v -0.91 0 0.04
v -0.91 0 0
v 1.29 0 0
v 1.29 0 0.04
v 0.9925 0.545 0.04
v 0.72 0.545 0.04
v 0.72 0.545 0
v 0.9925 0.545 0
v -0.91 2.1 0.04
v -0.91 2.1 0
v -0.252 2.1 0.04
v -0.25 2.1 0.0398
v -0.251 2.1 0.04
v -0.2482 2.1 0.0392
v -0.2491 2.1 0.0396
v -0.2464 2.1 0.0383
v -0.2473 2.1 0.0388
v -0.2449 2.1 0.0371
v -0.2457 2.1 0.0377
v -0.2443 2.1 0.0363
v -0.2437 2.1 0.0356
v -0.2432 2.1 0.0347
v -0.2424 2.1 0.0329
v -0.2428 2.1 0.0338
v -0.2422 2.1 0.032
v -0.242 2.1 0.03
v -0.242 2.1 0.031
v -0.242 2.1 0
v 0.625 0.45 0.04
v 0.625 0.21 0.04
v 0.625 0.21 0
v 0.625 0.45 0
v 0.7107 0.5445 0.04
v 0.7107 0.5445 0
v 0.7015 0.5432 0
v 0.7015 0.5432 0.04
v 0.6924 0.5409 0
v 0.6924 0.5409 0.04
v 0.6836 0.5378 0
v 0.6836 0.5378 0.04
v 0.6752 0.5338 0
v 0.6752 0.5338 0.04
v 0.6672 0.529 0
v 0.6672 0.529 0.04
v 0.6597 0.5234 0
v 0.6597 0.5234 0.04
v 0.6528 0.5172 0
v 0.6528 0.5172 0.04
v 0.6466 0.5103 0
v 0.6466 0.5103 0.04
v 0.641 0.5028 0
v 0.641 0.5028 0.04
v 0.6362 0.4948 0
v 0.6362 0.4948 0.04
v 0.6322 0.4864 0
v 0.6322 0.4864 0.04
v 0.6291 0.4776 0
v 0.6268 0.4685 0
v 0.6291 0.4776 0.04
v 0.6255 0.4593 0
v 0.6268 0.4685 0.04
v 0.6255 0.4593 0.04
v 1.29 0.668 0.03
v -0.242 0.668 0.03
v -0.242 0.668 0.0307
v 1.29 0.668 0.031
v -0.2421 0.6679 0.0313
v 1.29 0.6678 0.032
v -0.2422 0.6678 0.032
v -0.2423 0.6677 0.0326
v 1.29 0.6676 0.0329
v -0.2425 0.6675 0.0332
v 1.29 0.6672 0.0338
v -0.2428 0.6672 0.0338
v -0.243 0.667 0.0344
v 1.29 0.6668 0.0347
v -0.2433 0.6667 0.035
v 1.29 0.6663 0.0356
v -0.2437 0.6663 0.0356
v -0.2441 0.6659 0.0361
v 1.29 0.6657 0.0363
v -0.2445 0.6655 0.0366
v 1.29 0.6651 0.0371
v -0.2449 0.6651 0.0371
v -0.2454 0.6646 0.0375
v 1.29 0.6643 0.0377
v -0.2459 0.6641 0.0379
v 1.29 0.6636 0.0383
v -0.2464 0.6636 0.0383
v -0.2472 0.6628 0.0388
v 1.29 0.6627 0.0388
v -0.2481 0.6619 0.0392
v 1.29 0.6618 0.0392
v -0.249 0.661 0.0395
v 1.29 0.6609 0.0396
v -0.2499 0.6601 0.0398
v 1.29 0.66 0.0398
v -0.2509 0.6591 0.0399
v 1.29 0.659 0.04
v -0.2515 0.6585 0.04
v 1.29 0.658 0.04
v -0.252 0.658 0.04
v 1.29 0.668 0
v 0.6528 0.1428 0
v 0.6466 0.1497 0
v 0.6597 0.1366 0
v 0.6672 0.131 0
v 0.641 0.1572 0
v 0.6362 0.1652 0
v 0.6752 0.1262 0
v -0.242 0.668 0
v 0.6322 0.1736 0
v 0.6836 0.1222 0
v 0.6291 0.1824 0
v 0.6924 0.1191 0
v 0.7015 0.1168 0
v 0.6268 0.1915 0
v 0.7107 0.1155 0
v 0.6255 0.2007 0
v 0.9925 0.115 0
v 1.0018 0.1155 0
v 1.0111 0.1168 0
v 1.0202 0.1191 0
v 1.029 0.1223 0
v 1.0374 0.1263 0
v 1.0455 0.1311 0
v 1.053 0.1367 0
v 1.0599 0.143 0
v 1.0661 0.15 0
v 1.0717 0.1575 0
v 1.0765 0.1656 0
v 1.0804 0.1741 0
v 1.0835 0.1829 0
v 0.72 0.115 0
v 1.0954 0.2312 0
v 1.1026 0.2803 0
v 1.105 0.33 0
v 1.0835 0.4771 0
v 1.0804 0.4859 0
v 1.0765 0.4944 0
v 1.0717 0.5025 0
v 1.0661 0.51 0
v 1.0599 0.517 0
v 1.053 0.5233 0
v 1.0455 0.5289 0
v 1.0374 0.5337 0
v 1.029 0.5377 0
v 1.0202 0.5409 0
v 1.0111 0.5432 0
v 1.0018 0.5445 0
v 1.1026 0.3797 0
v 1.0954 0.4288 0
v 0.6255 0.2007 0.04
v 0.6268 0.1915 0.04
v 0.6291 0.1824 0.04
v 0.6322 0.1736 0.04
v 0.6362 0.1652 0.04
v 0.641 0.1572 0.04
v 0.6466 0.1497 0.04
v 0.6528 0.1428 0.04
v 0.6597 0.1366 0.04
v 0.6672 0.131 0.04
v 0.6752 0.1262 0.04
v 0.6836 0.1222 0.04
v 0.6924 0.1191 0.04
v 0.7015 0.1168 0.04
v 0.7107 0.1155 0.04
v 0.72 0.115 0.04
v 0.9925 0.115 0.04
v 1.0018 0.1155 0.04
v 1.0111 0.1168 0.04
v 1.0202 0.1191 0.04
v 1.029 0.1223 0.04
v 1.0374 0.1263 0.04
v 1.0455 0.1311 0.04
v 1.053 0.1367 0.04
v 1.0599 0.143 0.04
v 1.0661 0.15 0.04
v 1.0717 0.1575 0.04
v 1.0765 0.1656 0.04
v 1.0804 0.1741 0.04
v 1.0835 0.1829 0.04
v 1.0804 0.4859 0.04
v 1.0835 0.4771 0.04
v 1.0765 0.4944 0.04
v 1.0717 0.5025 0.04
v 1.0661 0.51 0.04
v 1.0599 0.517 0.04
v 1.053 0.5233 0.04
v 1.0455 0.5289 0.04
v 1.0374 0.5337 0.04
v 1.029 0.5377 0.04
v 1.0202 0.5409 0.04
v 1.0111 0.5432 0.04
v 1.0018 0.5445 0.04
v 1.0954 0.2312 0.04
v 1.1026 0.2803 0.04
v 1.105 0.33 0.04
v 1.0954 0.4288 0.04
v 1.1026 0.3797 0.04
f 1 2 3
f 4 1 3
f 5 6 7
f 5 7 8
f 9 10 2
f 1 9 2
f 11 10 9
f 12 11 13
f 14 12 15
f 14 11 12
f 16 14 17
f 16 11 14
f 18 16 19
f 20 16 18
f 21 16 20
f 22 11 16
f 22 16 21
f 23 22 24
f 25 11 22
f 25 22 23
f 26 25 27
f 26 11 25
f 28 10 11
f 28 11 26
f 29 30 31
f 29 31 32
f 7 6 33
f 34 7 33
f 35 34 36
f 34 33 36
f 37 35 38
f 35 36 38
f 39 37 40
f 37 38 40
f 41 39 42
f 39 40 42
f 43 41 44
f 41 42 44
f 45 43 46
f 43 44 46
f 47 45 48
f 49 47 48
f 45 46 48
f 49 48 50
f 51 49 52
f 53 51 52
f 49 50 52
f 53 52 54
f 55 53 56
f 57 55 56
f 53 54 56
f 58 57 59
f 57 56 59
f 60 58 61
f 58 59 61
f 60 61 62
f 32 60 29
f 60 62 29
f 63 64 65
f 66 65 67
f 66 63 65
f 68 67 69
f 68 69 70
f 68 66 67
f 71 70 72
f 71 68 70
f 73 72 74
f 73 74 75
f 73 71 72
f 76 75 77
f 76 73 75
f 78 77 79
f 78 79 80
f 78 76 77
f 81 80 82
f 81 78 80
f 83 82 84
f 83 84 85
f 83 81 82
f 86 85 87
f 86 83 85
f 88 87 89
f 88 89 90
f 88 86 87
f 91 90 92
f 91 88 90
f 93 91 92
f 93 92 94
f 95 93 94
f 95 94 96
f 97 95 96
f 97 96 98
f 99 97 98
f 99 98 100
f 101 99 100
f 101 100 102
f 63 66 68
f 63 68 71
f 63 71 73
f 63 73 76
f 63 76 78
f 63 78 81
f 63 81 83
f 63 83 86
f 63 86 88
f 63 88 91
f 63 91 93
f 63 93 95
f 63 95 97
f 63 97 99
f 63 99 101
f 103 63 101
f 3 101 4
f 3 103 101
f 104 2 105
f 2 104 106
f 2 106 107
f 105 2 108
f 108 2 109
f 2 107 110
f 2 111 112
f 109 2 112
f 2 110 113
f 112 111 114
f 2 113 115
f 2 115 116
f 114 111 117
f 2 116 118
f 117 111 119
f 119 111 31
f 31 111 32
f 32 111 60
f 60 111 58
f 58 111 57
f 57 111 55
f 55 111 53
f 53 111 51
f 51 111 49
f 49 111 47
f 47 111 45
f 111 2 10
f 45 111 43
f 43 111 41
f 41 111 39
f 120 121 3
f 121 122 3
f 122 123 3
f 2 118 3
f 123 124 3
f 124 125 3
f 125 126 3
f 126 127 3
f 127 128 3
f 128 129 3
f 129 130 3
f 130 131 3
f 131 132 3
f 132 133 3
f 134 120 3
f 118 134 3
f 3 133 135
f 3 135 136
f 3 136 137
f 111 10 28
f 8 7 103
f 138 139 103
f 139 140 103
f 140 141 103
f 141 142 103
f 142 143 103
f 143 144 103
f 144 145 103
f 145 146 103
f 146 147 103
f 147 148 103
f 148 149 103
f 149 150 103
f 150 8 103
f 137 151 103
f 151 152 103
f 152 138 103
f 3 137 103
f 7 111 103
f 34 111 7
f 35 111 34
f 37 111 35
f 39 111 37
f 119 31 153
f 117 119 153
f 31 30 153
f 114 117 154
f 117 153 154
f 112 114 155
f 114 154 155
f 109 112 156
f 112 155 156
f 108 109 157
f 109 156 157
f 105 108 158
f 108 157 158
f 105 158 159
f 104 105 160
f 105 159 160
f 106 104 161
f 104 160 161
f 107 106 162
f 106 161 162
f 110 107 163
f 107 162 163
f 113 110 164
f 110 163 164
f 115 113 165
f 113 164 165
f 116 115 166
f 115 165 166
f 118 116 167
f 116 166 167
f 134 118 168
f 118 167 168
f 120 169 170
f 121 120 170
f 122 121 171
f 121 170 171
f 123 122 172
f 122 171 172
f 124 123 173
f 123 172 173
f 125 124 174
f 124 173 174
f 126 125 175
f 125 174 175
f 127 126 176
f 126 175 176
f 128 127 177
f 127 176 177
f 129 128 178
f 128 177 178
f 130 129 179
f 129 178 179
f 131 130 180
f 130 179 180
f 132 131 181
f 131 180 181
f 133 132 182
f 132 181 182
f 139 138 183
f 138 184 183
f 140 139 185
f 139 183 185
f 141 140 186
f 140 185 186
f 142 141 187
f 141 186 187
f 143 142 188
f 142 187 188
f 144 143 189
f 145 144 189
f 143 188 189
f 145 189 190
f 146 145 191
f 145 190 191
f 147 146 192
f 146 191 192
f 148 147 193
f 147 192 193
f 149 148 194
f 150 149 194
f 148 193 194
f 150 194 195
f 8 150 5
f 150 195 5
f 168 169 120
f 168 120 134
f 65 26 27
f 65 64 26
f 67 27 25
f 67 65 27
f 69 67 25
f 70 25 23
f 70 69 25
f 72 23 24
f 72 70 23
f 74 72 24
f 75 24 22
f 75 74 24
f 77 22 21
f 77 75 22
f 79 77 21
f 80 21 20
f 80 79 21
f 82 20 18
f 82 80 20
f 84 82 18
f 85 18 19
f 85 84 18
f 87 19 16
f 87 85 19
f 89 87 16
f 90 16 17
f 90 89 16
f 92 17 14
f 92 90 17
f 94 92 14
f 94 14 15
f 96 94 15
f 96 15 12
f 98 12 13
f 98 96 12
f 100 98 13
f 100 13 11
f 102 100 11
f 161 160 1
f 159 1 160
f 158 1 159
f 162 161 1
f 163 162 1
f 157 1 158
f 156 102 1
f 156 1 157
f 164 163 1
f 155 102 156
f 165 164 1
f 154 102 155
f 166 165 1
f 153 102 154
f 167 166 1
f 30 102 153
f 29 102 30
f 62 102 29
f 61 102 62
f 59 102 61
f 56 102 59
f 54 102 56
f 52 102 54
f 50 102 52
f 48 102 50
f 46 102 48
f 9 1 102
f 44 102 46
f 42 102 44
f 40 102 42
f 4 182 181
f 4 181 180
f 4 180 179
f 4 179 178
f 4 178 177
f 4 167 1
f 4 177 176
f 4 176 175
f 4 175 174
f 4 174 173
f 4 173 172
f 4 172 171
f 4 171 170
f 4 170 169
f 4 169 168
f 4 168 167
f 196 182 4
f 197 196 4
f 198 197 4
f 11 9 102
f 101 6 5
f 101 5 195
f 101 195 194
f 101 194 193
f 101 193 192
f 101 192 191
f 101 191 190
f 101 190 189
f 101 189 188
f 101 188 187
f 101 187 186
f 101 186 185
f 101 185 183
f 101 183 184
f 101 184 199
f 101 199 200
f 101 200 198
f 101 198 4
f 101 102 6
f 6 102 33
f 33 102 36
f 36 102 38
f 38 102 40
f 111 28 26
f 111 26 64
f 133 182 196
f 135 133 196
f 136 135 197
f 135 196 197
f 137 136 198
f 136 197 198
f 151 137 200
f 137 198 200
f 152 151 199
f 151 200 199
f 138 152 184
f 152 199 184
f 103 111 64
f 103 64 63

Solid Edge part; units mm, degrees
sketch "Sketch1" plane through (0, 0, 0) normal (0, 0, 1) x (1, 0, 0)
  line L0 (-0.91, 2.1) -> (-0.91, 0)
  line L1 (-0.91, 0) -> (1.29, 0)
  line L2 (1.29, 0.668) -> (1.29, 0)
  line L3 (-0.242, 0.668) -> (1.29, 0.668)
  line L4 (-0.242, 2.1) -> (-0.242, 0.668)
  line L5 (-0.91, 2.1) -> (-0.242, 2.1)
  dimension "D1" = 0.05
  dimension "D2" = 0.05
extrude "Protrusion1" add sketch "Sketch1" along normal blind 0.04
fillet "Verrundung_1" radius 0.01 2 edges at (-0.242, 1.384, 0.04) (0.524, 0.668, 0.04)
sketch "Sketch2" plane through (0.2, 1.05, 0.04) normal (0, 0, 1) x (-1, 0, 0)
  line L0 (-0.7925, 0.935) -> (-0.52, 0.935)
  arc A0 (-0.52, 0.935) -> (-0.425, 0.84) centre (-0.52, 0.84) cw
  line L1 (-0.425, 0.84) -> (-0.425, 0.6)
  arc A1 (-0.425, 0.6) -> (-0.52, 0.505) centre (-0.52, 0.6) cw
  line L2 (-0.52, 0.505) -> (-0.7925, 0.505)
  arc A2 (-0.7925, 0.505) -> (-0.8835, 0.5729) centre (-0.7925, 0.6) cw
  arc A3 (-0.8835, 0.5729) -> (-0.8835, 0.8671) centre (-0.39, 0.72) cw
  arc A4 (-0.8835, 0.8671) -> (-0.7925, 0.935) centre (-0.7925, 0.84) cw
extrude "Cutout1" cut sketch "Sketch2" against normal through all
